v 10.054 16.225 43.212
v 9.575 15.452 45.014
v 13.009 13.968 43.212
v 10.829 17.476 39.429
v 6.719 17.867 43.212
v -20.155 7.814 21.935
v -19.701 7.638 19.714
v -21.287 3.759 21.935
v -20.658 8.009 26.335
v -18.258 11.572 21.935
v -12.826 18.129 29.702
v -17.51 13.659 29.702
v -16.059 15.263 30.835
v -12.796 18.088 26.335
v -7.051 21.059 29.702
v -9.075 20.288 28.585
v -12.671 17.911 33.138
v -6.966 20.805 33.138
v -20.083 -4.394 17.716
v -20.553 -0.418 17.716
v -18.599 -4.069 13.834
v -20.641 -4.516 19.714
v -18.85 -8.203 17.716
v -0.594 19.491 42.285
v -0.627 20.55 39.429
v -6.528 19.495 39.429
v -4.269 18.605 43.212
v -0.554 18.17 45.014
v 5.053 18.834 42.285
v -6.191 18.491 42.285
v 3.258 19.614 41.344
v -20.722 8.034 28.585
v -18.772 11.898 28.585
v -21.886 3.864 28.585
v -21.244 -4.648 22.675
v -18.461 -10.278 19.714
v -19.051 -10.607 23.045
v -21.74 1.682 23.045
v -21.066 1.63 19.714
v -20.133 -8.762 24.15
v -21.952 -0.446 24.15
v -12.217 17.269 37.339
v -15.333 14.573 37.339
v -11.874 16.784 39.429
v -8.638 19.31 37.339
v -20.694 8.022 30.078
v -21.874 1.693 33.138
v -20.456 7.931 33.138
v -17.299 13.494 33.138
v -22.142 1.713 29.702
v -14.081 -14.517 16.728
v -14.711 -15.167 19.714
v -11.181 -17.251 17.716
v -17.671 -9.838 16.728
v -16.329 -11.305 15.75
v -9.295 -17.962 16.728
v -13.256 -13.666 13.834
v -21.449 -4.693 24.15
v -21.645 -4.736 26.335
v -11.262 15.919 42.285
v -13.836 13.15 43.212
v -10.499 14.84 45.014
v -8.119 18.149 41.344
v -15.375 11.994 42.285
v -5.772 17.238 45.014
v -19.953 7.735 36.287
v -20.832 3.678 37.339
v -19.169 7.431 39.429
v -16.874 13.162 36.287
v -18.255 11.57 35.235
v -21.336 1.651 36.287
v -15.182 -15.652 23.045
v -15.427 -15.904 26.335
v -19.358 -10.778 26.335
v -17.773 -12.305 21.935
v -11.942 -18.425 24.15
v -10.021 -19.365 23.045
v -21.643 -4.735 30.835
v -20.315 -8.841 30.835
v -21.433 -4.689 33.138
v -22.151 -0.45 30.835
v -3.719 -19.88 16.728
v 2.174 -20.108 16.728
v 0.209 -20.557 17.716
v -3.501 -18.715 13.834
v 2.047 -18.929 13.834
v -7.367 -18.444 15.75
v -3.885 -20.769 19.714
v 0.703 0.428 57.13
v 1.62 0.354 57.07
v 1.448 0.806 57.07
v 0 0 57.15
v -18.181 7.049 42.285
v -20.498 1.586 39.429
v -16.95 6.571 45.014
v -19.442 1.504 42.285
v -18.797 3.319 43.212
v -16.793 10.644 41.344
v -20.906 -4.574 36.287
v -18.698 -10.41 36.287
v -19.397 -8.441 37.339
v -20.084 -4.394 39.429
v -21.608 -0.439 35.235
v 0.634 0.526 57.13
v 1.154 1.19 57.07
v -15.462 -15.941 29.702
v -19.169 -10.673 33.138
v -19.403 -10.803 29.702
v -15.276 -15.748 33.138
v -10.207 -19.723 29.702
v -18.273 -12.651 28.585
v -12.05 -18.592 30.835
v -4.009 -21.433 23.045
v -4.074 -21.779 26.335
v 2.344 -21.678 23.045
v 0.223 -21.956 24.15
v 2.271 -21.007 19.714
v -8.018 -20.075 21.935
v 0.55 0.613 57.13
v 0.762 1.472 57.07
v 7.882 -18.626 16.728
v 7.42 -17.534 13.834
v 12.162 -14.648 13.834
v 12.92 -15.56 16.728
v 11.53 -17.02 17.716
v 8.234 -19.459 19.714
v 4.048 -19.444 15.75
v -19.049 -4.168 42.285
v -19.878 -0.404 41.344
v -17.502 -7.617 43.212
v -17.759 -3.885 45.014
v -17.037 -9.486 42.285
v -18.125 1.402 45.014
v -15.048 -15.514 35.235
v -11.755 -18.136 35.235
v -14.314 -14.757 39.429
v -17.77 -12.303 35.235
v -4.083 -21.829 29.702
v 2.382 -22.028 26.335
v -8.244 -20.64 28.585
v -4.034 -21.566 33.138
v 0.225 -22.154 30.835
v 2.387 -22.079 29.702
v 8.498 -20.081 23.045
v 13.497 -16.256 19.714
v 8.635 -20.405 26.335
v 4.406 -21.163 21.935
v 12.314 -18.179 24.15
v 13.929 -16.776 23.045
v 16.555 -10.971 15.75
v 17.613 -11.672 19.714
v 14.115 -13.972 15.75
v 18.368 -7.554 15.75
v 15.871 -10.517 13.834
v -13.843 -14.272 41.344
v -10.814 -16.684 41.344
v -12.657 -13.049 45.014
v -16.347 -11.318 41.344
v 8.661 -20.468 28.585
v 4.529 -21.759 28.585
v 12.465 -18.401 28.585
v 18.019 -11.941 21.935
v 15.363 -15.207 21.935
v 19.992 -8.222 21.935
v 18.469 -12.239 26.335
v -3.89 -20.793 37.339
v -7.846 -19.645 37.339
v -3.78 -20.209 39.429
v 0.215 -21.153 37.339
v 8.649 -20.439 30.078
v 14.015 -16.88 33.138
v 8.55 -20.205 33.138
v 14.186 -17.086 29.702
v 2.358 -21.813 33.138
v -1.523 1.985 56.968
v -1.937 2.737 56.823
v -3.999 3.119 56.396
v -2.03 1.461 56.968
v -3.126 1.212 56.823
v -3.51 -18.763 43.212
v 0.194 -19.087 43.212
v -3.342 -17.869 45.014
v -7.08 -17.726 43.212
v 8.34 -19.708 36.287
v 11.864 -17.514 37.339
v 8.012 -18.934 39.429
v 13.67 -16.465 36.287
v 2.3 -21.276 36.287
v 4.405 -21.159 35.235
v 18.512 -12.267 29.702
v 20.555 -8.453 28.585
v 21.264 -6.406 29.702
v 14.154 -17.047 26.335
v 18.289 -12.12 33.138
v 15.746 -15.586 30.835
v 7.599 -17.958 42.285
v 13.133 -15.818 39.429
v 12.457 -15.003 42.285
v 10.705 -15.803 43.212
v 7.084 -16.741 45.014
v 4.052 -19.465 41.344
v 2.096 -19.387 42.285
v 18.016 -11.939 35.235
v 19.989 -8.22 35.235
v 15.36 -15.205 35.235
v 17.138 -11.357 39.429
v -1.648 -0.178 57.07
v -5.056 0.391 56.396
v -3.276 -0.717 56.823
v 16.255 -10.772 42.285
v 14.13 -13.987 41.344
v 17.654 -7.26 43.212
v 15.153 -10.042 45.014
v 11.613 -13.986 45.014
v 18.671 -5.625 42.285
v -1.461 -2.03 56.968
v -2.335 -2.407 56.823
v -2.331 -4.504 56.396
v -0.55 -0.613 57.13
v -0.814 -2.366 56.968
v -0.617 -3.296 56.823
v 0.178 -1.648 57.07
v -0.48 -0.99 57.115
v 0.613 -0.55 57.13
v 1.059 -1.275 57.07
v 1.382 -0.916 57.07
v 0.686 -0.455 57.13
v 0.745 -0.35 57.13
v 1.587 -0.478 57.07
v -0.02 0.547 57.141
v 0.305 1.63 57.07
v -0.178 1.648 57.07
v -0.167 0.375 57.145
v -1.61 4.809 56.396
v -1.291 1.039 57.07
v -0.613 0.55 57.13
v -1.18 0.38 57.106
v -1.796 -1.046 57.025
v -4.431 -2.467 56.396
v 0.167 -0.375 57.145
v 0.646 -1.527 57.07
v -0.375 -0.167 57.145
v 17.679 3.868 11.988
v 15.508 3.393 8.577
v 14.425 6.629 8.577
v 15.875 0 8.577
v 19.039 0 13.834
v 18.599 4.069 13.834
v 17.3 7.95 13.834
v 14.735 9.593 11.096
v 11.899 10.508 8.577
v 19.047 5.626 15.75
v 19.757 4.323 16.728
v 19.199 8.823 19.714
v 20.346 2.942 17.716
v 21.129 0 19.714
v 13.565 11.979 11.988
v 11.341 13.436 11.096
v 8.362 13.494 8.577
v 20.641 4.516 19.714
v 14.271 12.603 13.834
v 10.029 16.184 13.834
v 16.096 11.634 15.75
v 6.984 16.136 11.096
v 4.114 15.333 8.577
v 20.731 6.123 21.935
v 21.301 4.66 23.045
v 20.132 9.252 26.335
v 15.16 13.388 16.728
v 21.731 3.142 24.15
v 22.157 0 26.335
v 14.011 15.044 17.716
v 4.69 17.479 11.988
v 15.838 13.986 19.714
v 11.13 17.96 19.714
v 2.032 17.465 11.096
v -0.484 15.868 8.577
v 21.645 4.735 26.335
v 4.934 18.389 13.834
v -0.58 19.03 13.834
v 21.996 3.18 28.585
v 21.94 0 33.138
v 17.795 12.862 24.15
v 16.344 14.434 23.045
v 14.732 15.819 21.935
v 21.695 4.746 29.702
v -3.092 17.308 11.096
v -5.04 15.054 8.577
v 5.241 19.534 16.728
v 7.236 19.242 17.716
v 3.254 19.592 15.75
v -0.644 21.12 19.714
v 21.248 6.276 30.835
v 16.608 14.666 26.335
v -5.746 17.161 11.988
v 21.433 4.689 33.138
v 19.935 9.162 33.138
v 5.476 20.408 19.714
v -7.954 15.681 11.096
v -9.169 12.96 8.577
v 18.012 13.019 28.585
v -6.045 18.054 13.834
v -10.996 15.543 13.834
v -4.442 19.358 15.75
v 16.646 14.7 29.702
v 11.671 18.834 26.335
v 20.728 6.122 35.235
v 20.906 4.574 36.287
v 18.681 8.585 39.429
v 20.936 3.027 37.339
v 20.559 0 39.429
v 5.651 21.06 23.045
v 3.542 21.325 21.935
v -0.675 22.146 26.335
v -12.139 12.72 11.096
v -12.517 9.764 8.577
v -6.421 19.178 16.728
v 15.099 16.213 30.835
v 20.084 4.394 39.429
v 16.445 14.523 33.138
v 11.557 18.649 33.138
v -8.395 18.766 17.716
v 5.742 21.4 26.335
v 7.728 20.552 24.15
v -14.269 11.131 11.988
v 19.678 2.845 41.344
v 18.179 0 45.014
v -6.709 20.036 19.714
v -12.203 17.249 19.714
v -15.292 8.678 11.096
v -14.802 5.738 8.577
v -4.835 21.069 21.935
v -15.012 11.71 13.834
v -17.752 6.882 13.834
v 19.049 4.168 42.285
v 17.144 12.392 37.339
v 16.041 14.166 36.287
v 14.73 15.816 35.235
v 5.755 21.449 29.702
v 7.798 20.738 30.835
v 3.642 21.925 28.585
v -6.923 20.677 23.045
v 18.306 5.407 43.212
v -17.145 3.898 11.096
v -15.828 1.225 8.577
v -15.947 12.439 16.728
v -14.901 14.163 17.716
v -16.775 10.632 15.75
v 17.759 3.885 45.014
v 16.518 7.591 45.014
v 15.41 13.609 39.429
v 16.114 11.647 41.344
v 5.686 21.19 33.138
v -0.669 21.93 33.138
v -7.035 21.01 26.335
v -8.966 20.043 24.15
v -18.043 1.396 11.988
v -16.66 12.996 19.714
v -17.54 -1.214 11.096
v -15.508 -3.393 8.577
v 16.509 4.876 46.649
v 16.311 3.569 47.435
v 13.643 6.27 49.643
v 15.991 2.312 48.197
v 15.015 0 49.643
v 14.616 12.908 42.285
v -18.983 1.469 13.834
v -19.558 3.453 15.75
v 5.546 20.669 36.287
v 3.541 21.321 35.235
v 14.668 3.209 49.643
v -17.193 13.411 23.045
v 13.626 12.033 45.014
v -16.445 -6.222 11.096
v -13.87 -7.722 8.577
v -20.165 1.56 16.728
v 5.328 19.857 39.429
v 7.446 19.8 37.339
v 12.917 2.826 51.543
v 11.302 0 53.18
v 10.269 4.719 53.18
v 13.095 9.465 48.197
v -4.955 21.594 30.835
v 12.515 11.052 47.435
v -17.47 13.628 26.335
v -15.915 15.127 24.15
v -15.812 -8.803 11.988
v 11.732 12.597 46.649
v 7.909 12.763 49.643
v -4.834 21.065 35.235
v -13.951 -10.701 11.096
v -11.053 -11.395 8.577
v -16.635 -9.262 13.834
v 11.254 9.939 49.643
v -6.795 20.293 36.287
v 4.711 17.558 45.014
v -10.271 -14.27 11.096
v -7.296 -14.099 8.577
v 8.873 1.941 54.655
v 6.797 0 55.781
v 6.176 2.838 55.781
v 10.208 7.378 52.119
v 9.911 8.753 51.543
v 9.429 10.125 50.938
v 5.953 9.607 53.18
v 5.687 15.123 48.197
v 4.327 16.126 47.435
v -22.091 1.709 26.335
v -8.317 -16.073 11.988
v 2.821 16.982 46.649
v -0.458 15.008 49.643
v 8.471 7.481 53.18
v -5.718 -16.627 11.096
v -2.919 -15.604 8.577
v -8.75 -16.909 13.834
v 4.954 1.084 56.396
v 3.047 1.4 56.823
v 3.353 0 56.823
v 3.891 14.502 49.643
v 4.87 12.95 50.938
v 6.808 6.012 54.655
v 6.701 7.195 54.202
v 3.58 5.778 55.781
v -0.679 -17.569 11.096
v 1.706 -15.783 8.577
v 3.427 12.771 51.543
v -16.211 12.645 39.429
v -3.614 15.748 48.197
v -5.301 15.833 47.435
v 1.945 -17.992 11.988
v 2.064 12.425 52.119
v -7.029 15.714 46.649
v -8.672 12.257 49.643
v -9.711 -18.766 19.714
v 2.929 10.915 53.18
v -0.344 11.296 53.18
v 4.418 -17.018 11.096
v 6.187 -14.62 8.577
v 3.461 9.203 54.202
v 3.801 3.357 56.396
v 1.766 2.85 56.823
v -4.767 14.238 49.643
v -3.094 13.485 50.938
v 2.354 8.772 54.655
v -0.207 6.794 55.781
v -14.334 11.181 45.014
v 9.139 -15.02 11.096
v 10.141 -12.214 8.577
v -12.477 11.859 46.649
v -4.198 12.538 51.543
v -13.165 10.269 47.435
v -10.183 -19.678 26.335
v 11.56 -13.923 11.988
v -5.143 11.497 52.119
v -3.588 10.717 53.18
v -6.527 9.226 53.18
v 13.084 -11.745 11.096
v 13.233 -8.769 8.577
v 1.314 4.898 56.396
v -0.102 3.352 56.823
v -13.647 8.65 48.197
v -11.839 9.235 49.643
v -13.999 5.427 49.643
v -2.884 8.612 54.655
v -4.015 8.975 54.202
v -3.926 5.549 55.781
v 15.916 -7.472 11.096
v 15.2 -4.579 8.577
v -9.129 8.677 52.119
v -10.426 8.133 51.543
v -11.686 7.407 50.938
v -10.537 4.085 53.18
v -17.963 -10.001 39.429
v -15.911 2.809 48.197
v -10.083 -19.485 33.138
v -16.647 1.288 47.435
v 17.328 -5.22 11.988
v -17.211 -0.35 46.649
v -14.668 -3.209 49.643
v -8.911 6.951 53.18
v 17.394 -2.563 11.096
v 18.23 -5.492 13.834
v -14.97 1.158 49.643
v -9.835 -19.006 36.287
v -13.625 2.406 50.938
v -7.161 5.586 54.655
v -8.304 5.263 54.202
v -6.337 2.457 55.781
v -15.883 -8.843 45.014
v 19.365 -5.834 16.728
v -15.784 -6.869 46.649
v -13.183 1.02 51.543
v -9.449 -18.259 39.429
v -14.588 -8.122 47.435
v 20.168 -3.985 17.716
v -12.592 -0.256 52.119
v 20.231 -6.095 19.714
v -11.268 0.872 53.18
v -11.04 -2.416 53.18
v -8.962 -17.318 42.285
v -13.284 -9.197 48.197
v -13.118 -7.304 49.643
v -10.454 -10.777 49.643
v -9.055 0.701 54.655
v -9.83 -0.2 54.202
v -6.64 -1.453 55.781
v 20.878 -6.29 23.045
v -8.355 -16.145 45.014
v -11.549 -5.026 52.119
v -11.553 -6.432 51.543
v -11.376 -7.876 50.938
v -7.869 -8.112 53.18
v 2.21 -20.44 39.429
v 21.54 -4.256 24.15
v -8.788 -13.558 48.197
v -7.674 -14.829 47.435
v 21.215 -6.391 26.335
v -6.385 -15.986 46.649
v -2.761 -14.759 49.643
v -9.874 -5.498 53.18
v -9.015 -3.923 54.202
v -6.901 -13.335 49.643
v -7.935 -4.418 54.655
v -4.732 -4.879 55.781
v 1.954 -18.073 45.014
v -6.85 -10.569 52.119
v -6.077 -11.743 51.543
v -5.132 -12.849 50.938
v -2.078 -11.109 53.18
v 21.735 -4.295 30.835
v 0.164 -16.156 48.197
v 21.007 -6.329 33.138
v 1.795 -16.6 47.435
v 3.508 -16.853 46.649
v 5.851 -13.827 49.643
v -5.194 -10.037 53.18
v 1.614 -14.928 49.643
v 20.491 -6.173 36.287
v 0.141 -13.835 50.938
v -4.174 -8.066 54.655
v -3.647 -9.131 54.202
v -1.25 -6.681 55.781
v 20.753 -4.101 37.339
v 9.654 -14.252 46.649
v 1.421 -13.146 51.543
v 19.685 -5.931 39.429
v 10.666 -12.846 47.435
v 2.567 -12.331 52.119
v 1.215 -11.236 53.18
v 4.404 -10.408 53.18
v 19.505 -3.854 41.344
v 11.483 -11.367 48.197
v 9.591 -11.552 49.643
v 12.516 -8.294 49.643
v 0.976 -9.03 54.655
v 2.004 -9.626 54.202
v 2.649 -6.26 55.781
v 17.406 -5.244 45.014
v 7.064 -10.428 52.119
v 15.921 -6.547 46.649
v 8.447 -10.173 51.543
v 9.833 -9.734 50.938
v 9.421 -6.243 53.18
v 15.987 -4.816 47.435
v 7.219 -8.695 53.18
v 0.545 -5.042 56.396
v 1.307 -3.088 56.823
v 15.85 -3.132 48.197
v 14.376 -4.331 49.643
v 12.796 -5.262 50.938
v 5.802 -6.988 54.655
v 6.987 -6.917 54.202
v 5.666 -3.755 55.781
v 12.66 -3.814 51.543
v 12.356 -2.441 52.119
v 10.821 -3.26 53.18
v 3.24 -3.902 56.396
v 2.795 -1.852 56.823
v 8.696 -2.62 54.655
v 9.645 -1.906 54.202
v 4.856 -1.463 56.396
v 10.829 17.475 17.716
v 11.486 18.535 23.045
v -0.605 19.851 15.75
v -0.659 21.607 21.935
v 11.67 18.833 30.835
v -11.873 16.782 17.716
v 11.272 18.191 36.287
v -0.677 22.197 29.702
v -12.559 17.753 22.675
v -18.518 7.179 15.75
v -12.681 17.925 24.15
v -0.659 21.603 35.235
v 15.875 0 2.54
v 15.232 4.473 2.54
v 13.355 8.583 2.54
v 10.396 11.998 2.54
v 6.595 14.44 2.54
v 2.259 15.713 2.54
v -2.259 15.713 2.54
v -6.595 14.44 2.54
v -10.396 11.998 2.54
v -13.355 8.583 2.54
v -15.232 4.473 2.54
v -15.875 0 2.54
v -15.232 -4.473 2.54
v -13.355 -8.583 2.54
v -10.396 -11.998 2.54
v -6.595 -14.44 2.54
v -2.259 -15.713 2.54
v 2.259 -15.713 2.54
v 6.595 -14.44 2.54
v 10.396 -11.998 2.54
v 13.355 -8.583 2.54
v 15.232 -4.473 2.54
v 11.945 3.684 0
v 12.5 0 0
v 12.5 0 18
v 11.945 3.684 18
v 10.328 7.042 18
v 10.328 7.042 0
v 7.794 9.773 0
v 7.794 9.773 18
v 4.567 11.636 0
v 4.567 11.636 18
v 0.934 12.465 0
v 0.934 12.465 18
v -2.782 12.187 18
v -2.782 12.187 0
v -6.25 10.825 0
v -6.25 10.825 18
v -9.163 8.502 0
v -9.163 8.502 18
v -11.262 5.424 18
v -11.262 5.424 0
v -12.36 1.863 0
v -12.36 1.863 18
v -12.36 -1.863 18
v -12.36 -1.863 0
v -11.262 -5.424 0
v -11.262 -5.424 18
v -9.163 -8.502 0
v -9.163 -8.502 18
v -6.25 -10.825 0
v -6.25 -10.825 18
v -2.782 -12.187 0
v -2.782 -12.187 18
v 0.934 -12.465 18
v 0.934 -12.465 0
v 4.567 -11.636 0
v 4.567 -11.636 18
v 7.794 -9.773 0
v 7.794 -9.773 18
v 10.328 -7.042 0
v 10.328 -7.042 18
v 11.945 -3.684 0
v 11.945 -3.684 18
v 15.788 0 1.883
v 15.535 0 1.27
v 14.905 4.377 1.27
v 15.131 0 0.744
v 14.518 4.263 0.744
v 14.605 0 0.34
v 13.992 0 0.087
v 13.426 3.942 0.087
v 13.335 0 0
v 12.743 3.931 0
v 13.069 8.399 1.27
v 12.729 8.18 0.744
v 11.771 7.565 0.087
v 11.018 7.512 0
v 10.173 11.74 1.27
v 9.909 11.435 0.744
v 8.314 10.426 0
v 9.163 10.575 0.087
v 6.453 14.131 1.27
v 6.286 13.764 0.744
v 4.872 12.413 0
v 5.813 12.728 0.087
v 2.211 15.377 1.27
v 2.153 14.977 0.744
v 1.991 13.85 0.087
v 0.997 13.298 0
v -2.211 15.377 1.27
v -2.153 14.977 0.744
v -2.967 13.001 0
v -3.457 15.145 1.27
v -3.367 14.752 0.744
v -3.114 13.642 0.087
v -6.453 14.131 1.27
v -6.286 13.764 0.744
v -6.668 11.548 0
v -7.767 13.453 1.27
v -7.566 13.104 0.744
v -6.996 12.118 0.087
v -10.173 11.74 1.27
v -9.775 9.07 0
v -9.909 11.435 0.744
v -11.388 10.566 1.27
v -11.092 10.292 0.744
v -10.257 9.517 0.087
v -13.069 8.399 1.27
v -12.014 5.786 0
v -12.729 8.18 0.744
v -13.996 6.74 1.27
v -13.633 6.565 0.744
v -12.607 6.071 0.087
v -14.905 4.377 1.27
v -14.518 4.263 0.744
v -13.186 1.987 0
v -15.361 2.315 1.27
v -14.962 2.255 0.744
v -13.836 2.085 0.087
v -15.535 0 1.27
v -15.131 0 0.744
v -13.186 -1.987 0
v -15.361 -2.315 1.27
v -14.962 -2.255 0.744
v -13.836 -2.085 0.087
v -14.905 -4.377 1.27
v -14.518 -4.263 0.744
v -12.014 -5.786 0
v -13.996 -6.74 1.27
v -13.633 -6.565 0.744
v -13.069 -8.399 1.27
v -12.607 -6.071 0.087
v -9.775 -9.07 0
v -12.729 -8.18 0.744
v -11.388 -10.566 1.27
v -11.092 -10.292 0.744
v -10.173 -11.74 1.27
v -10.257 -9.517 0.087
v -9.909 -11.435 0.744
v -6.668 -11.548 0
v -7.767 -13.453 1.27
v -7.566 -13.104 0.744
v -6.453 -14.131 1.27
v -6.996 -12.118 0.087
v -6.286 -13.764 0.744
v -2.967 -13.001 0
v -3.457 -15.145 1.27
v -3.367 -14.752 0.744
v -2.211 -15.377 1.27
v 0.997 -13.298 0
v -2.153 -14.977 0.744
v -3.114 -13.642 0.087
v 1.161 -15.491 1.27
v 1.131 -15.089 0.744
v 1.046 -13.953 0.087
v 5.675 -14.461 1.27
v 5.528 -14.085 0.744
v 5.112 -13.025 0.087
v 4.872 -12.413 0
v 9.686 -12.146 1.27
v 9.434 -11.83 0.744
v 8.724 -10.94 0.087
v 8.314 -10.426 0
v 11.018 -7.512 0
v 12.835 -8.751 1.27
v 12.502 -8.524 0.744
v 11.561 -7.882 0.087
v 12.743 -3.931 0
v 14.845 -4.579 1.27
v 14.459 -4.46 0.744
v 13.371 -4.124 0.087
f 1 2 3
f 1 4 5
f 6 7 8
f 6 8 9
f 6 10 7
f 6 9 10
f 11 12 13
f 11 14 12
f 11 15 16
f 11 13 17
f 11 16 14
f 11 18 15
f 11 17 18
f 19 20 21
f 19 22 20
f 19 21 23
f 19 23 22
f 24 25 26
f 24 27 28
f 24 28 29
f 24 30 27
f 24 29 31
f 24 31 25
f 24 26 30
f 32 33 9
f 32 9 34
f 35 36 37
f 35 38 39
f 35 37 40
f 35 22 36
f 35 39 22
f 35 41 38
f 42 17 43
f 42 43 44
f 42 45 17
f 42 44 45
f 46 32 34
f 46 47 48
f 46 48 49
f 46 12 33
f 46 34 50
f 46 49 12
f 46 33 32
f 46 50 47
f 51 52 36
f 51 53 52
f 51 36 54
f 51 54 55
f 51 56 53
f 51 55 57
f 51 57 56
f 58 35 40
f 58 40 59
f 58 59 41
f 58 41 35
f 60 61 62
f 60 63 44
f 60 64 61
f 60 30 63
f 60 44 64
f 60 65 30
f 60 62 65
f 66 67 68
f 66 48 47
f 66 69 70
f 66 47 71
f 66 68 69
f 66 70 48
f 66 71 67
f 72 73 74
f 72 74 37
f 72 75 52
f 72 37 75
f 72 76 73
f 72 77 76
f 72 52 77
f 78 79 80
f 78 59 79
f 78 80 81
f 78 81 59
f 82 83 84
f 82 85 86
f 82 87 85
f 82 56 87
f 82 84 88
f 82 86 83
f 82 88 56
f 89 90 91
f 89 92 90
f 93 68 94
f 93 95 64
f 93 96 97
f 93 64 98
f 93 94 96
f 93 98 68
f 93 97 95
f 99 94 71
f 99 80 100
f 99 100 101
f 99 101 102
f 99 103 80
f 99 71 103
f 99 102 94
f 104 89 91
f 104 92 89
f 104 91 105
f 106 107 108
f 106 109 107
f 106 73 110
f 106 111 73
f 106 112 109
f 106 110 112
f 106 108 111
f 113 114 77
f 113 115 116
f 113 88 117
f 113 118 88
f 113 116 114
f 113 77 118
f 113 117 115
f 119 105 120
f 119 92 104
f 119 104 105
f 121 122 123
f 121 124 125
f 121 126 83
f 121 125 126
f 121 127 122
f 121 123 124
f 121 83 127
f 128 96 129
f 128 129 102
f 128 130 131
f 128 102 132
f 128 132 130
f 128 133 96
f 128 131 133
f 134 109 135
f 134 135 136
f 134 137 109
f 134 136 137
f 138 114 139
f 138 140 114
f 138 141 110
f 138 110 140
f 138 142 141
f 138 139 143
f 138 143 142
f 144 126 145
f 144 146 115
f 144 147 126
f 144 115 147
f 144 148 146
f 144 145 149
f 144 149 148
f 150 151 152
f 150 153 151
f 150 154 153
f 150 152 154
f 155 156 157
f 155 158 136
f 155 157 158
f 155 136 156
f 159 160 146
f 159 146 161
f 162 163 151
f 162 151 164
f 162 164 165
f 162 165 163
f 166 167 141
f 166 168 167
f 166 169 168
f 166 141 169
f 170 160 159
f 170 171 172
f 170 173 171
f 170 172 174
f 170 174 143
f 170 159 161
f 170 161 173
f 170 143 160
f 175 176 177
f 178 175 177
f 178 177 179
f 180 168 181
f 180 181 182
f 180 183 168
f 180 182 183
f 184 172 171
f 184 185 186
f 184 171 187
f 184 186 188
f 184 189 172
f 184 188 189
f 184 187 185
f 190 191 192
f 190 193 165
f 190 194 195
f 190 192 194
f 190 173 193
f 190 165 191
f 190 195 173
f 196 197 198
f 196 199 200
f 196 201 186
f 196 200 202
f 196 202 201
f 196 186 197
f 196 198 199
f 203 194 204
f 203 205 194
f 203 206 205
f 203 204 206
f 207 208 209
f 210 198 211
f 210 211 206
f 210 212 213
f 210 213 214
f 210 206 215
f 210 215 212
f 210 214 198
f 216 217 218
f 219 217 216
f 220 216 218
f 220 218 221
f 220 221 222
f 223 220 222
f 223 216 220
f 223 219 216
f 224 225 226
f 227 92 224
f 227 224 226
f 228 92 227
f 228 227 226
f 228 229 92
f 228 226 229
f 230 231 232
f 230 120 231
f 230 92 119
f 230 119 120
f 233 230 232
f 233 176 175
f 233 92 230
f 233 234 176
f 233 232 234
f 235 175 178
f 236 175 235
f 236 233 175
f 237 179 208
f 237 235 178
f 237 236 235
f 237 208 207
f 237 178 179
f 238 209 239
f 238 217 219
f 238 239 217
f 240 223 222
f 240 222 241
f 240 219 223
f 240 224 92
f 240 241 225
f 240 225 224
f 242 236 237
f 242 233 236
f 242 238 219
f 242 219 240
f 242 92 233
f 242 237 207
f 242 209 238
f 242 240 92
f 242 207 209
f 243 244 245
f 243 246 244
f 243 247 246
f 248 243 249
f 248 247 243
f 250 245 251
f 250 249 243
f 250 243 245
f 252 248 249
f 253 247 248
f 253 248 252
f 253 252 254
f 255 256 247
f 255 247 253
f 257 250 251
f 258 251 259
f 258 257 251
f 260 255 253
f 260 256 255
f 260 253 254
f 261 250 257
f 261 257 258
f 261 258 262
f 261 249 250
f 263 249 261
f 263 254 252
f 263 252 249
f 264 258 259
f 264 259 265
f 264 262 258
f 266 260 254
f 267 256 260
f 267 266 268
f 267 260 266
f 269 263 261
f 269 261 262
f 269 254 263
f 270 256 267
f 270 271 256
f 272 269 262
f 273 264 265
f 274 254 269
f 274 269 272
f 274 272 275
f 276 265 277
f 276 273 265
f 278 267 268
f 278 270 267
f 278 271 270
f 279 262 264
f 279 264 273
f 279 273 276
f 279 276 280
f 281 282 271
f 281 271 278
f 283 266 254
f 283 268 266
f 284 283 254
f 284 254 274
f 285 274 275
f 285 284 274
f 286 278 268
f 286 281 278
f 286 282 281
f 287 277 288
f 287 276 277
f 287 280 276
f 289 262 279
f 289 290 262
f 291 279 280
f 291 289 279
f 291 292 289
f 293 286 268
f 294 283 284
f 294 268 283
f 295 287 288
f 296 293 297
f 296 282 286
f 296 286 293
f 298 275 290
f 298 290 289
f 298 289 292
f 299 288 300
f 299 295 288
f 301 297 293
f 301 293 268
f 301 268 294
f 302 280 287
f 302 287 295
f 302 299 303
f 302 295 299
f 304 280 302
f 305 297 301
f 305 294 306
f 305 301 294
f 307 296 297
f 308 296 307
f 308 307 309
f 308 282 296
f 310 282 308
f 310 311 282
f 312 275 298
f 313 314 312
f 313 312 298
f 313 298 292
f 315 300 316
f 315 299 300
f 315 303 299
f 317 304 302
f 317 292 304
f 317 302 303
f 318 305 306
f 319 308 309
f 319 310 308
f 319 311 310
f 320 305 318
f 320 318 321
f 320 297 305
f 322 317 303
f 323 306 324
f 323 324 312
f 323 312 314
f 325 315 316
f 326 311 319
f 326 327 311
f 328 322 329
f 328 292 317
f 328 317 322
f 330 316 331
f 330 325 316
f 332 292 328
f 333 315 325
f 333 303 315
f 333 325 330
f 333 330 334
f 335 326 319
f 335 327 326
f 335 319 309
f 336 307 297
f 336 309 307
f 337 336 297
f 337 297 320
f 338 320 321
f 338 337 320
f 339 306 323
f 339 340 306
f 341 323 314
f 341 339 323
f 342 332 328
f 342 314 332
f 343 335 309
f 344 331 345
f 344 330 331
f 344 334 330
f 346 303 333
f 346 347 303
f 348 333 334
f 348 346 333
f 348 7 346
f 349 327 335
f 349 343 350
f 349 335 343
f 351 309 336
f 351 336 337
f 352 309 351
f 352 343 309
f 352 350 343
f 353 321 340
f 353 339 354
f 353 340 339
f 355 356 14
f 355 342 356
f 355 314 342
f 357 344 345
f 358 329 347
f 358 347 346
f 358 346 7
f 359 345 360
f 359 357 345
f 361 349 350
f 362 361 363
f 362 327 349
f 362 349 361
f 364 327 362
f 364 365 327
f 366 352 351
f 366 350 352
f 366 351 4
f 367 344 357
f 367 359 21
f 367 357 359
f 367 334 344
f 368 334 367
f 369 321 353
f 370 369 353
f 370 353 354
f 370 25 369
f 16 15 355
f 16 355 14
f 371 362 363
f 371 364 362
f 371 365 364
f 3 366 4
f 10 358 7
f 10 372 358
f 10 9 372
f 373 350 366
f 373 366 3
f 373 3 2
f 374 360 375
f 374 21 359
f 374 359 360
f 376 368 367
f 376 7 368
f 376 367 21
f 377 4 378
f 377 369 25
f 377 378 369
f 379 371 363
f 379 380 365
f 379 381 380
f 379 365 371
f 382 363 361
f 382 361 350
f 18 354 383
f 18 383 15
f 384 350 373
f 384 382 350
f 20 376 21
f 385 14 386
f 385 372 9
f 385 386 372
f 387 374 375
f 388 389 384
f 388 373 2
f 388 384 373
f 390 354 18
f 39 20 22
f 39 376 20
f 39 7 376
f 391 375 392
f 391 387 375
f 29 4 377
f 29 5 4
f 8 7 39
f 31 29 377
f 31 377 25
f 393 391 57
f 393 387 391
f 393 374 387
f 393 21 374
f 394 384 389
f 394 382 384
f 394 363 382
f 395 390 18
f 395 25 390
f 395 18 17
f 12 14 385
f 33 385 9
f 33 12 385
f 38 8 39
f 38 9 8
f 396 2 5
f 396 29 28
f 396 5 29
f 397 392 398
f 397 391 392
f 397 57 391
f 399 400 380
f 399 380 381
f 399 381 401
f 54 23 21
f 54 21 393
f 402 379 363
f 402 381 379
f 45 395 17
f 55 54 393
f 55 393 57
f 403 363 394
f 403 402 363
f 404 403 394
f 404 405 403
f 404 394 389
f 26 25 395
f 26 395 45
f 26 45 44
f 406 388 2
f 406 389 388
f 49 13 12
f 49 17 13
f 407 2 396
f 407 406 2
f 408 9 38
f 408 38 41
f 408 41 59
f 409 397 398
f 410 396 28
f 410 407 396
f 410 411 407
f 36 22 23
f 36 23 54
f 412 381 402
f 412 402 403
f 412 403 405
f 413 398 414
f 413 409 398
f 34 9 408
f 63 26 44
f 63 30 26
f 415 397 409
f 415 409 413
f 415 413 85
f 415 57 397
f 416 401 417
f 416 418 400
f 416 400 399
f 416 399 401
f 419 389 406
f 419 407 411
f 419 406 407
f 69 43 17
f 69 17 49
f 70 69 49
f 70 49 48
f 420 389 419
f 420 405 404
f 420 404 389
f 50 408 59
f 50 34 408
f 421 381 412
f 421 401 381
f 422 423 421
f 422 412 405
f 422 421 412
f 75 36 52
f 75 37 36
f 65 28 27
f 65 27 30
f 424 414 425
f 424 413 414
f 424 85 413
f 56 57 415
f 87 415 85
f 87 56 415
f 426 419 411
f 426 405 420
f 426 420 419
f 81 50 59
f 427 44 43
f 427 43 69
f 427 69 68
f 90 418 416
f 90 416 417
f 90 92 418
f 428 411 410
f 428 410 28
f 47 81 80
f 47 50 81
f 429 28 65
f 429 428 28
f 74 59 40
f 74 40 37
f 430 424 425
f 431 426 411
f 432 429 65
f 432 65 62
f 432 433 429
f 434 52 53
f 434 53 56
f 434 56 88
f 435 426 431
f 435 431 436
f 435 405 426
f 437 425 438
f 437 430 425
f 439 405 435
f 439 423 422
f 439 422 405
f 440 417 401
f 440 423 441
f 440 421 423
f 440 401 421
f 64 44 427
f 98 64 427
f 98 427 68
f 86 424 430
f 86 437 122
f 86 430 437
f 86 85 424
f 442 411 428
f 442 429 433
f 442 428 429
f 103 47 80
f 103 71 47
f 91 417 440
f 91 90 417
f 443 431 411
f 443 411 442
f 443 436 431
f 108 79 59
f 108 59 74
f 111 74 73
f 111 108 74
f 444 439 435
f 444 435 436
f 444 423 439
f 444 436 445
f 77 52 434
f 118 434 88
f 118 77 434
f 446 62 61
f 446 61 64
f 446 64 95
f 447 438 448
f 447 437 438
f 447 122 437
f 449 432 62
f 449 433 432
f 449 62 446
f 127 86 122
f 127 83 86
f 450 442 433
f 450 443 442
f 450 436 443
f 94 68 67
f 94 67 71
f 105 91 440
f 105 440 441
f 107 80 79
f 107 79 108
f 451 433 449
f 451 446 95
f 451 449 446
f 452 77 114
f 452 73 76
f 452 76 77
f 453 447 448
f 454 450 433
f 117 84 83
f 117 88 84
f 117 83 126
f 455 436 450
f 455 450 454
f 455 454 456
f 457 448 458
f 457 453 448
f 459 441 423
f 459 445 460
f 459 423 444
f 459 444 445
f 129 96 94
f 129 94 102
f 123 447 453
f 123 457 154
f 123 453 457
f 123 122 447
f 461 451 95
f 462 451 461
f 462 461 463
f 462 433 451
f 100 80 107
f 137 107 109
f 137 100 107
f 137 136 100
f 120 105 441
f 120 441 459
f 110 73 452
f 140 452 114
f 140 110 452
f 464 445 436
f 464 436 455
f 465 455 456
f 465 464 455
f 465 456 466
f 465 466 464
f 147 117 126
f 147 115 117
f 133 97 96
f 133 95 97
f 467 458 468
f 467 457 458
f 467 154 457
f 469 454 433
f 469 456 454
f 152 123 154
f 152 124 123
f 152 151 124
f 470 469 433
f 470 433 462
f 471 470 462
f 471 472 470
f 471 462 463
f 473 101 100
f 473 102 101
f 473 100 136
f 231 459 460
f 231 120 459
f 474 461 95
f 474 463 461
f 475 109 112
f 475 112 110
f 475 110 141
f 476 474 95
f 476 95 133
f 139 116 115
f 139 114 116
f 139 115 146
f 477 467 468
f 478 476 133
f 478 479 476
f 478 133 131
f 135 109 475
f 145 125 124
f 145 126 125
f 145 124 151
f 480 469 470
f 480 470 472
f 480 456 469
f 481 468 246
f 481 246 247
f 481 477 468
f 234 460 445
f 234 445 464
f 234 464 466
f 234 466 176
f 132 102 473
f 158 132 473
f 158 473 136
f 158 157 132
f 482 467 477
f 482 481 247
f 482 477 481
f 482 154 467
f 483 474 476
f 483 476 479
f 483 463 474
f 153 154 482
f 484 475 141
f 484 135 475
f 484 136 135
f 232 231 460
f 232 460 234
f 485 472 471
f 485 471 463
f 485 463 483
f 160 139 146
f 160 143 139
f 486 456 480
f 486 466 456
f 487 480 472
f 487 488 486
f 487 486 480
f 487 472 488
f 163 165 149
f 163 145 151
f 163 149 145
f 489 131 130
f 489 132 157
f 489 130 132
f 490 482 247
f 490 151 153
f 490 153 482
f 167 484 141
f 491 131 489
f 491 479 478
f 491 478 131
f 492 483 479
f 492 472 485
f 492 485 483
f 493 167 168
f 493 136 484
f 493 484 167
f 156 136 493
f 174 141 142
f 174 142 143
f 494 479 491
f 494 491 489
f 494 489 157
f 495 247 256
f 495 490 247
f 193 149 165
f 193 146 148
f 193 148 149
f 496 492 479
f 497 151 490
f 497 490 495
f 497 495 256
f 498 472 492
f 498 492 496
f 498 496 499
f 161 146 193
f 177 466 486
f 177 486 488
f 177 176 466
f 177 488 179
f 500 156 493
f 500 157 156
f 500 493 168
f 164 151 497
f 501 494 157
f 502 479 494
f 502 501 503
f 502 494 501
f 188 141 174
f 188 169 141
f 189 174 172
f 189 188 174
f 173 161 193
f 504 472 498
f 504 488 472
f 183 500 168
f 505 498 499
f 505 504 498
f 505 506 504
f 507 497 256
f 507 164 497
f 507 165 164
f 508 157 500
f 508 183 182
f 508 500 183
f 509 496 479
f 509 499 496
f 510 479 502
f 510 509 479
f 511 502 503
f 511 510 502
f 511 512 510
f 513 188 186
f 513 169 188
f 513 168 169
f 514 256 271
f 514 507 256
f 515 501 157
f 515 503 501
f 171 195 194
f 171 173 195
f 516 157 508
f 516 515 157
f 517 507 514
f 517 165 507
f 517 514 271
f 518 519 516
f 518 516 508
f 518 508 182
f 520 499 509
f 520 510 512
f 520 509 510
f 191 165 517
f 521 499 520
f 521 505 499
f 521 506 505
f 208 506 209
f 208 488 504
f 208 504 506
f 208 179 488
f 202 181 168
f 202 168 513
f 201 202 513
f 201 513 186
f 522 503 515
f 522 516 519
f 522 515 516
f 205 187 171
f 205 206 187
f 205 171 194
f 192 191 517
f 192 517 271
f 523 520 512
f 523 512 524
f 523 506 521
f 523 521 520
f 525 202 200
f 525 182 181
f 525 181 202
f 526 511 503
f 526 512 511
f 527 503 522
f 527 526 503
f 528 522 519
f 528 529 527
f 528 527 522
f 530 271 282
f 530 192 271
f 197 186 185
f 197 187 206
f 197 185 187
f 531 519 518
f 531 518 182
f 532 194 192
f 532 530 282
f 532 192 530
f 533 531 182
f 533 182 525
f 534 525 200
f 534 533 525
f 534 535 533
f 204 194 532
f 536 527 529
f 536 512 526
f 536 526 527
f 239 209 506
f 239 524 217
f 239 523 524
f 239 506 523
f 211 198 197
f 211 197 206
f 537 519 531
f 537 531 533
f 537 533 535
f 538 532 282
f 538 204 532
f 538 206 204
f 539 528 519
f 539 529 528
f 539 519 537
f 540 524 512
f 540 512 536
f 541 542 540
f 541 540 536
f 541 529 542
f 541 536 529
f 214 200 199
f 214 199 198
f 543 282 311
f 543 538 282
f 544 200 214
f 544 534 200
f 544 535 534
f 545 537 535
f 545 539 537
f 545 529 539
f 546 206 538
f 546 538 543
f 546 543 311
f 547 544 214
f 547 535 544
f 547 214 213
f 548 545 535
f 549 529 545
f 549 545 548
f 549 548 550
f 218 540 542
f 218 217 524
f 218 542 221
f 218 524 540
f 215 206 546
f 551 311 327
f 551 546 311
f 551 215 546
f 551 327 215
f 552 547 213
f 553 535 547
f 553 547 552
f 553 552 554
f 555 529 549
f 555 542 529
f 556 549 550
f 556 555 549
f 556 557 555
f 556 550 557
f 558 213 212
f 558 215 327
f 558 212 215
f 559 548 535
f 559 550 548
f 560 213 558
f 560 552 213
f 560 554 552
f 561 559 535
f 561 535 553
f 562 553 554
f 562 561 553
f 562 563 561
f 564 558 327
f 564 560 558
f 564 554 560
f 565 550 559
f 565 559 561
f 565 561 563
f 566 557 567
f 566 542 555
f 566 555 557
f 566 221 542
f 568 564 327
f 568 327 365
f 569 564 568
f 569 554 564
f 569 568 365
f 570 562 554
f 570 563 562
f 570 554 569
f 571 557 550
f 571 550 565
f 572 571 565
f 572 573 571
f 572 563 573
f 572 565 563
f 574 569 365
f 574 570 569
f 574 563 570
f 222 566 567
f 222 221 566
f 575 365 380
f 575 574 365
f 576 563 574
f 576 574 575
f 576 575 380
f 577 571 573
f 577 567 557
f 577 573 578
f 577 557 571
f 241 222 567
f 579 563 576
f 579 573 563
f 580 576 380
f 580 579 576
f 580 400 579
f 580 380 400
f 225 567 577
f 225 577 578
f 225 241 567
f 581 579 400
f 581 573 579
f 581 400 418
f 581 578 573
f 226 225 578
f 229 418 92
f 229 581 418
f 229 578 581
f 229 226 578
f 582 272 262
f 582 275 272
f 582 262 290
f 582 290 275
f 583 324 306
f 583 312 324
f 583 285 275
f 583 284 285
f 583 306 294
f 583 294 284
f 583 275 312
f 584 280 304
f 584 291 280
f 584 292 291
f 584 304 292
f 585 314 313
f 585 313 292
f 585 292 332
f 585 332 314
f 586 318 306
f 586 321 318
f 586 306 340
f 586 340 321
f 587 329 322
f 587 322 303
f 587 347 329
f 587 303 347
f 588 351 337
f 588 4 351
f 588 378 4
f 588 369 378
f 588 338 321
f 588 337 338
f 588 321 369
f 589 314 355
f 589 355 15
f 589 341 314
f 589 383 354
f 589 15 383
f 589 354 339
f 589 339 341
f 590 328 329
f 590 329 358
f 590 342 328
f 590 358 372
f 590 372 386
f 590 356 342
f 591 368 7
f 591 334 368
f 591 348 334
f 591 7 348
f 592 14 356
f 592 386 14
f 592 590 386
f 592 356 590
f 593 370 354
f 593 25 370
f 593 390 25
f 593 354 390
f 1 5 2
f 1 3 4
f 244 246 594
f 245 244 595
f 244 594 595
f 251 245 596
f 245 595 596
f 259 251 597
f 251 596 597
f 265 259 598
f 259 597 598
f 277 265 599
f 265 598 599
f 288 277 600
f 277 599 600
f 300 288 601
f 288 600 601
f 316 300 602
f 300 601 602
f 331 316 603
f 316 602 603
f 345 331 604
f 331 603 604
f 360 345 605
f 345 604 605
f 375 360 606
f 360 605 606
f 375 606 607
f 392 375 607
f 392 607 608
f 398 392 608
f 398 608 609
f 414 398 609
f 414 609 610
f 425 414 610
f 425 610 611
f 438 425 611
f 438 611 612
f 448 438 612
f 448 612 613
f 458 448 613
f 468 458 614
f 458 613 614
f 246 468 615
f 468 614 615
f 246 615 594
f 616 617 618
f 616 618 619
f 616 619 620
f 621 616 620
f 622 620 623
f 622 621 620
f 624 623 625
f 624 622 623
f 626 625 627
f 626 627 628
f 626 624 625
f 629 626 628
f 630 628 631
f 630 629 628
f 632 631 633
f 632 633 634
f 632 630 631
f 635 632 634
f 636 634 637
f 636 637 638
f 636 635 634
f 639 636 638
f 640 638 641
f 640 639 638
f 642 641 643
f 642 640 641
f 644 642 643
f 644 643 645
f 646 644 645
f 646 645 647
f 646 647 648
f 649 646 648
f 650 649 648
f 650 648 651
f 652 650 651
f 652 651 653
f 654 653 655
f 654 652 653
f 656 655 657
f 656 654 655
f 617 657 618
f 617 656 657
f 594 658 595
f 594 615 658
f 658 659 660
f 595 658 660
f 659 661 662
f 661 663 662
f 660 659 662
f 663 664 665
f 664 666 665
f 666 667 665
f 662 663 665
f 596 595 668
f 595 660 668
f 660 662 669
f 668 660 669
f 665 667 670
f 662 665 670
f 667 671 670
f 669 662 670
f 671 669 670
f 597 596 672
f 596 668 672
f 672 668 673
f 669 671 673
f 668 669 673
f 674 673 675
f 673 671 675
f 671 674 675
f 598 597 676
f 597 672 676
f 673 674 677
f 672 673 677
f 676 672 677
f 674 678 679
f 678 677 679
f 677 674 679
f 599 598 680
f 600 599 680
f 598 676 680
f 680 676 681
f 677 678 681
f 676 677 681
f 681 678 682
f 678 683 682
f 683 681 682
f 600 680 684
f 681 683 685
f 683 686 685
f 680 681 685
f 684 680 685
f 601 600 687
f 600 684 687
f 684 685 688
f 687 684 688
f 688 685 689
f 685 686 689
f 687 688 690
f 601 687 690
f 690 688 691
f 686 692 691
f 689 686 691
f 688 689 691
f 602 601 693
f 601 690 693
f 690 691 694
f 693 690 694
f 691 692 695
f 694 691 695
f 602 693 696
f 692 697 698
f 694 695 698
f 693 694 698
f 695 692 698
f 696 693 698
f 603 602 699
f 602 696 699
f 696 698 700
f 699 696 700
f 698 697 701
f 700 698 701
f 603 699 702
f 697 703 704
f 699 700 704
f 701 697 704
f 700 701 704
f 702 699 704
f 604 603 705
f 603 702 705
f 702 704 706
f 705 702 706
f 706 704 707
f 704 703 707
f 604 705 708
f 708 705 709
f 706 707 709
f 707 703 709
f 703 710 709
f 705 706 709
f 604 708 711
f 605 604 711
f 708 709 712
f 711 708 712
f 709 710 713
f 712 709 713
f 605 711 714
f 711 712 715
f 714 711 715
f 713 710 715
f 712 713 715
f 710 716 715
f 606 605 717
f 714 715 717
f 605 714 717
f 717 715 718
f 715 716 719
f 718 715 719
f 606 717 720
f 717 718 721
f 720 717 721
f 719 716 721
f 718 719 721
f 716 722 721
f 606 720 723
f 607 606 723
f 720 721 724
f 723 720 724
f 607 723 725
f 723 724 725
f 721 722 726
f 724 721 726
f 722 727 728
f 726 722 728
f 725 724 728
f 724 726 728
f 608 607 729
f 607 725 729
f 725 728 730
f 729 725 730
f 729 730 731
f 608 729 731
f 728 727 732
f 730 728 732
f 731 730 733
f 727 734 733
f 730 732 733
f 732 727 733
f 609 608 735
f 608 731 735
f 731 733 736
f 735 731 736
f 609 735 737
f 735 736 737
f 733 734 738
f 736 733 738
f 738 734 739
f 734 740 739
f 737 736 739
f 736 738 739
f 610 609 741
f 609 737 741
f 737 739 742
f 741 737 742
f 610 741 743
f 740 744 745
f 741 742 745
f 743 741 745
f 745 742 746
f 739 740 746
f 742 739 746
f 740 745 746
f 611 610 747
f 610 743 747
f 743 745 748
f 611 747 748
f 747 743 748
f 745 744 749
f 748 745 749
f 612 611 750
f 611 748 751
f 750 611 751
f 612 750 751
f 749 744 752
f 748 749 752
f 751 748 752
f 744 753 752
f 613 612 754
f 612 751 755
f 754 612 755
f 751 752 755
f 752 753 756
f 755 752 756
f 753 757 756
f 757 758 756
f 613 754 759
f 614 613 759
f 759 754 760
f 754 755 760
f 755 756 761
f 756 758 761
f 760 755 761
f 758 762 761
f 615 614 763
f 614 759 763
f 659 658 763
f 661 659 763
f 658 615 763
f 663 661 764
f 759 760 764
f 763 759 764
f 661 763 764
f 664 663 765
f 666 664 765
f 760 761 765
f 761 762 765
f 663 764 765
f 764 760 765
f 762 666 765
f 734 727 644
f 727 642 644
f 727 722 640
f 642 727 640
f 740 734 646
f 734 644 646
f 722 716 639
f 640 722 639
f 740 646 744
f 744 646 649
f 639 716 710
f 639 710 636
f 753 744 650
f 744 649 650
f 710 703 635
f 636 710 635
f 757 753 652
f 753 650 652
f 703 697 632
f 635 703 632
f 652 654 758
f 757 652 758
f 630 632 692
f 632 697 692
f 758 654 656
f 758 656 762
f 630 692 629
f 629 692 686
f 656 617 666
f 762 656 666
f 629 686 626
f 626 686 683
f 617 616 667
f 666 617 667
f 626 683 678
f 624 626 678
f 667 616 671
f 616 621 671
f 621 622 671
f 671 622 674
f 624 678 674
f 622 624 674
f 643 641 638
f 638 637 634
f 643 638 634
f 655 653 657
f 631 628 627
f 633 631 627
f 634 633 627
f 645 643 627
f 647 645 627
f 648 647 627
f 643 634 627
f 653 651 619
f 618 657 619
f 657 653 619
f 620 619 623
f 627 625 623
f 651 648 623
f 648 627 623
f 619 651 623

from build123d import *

# Parameters (mm, degrees)
F2_R     = 15.875
F3_DEPTH = 28.575
F4_R     = 12.5
F5_DEPTH = 18
F6_R     = 2.54


with BuildPart() as f1:
    # F0 (on Front) → F1 (revolve)
    with BuildSketch(Plane.XZ):
        with BuildLine():
            Line((0, 57.15), (0, 0))
            add(Edge.make_bspline(
                [(0, 0), (22.225, 0), (22.225, 28.575), (22.225, 57.15), (0, 57.15)],
                knots=[0, 0, 0, 1.5707963268, 1.5707963268, 3.1415926536, 3.1415926536, 3.1415926536], degree=2, weights=[1, 0.7071067812, 1, 0.7071067812, 1]))
        make_face()
    revolve(axis=Axis((0, 0, 28.575), (0, 0, 1)))

    # F2 (on Top) → F3 (join)
    with BuildSketch(Plane.XY):
        Circle(F2_R)
    extrude(amount=F3_DEPTH)

    # F4 (on Top) → F5 (cut)
    with BuildSketch(Plane.XY):
        Circle(F4_R)
    extrude(amount=F5_DEPTH, mode=Mode.SUBTRACT)

    # F6
    f6_edges = [f1.edges().sort_by_distance(p)[0] for p in [
        (-15.875, 0, 0),
    ]]
    fillet(f6_edges, radius=F6_R)


solid = f1.part
